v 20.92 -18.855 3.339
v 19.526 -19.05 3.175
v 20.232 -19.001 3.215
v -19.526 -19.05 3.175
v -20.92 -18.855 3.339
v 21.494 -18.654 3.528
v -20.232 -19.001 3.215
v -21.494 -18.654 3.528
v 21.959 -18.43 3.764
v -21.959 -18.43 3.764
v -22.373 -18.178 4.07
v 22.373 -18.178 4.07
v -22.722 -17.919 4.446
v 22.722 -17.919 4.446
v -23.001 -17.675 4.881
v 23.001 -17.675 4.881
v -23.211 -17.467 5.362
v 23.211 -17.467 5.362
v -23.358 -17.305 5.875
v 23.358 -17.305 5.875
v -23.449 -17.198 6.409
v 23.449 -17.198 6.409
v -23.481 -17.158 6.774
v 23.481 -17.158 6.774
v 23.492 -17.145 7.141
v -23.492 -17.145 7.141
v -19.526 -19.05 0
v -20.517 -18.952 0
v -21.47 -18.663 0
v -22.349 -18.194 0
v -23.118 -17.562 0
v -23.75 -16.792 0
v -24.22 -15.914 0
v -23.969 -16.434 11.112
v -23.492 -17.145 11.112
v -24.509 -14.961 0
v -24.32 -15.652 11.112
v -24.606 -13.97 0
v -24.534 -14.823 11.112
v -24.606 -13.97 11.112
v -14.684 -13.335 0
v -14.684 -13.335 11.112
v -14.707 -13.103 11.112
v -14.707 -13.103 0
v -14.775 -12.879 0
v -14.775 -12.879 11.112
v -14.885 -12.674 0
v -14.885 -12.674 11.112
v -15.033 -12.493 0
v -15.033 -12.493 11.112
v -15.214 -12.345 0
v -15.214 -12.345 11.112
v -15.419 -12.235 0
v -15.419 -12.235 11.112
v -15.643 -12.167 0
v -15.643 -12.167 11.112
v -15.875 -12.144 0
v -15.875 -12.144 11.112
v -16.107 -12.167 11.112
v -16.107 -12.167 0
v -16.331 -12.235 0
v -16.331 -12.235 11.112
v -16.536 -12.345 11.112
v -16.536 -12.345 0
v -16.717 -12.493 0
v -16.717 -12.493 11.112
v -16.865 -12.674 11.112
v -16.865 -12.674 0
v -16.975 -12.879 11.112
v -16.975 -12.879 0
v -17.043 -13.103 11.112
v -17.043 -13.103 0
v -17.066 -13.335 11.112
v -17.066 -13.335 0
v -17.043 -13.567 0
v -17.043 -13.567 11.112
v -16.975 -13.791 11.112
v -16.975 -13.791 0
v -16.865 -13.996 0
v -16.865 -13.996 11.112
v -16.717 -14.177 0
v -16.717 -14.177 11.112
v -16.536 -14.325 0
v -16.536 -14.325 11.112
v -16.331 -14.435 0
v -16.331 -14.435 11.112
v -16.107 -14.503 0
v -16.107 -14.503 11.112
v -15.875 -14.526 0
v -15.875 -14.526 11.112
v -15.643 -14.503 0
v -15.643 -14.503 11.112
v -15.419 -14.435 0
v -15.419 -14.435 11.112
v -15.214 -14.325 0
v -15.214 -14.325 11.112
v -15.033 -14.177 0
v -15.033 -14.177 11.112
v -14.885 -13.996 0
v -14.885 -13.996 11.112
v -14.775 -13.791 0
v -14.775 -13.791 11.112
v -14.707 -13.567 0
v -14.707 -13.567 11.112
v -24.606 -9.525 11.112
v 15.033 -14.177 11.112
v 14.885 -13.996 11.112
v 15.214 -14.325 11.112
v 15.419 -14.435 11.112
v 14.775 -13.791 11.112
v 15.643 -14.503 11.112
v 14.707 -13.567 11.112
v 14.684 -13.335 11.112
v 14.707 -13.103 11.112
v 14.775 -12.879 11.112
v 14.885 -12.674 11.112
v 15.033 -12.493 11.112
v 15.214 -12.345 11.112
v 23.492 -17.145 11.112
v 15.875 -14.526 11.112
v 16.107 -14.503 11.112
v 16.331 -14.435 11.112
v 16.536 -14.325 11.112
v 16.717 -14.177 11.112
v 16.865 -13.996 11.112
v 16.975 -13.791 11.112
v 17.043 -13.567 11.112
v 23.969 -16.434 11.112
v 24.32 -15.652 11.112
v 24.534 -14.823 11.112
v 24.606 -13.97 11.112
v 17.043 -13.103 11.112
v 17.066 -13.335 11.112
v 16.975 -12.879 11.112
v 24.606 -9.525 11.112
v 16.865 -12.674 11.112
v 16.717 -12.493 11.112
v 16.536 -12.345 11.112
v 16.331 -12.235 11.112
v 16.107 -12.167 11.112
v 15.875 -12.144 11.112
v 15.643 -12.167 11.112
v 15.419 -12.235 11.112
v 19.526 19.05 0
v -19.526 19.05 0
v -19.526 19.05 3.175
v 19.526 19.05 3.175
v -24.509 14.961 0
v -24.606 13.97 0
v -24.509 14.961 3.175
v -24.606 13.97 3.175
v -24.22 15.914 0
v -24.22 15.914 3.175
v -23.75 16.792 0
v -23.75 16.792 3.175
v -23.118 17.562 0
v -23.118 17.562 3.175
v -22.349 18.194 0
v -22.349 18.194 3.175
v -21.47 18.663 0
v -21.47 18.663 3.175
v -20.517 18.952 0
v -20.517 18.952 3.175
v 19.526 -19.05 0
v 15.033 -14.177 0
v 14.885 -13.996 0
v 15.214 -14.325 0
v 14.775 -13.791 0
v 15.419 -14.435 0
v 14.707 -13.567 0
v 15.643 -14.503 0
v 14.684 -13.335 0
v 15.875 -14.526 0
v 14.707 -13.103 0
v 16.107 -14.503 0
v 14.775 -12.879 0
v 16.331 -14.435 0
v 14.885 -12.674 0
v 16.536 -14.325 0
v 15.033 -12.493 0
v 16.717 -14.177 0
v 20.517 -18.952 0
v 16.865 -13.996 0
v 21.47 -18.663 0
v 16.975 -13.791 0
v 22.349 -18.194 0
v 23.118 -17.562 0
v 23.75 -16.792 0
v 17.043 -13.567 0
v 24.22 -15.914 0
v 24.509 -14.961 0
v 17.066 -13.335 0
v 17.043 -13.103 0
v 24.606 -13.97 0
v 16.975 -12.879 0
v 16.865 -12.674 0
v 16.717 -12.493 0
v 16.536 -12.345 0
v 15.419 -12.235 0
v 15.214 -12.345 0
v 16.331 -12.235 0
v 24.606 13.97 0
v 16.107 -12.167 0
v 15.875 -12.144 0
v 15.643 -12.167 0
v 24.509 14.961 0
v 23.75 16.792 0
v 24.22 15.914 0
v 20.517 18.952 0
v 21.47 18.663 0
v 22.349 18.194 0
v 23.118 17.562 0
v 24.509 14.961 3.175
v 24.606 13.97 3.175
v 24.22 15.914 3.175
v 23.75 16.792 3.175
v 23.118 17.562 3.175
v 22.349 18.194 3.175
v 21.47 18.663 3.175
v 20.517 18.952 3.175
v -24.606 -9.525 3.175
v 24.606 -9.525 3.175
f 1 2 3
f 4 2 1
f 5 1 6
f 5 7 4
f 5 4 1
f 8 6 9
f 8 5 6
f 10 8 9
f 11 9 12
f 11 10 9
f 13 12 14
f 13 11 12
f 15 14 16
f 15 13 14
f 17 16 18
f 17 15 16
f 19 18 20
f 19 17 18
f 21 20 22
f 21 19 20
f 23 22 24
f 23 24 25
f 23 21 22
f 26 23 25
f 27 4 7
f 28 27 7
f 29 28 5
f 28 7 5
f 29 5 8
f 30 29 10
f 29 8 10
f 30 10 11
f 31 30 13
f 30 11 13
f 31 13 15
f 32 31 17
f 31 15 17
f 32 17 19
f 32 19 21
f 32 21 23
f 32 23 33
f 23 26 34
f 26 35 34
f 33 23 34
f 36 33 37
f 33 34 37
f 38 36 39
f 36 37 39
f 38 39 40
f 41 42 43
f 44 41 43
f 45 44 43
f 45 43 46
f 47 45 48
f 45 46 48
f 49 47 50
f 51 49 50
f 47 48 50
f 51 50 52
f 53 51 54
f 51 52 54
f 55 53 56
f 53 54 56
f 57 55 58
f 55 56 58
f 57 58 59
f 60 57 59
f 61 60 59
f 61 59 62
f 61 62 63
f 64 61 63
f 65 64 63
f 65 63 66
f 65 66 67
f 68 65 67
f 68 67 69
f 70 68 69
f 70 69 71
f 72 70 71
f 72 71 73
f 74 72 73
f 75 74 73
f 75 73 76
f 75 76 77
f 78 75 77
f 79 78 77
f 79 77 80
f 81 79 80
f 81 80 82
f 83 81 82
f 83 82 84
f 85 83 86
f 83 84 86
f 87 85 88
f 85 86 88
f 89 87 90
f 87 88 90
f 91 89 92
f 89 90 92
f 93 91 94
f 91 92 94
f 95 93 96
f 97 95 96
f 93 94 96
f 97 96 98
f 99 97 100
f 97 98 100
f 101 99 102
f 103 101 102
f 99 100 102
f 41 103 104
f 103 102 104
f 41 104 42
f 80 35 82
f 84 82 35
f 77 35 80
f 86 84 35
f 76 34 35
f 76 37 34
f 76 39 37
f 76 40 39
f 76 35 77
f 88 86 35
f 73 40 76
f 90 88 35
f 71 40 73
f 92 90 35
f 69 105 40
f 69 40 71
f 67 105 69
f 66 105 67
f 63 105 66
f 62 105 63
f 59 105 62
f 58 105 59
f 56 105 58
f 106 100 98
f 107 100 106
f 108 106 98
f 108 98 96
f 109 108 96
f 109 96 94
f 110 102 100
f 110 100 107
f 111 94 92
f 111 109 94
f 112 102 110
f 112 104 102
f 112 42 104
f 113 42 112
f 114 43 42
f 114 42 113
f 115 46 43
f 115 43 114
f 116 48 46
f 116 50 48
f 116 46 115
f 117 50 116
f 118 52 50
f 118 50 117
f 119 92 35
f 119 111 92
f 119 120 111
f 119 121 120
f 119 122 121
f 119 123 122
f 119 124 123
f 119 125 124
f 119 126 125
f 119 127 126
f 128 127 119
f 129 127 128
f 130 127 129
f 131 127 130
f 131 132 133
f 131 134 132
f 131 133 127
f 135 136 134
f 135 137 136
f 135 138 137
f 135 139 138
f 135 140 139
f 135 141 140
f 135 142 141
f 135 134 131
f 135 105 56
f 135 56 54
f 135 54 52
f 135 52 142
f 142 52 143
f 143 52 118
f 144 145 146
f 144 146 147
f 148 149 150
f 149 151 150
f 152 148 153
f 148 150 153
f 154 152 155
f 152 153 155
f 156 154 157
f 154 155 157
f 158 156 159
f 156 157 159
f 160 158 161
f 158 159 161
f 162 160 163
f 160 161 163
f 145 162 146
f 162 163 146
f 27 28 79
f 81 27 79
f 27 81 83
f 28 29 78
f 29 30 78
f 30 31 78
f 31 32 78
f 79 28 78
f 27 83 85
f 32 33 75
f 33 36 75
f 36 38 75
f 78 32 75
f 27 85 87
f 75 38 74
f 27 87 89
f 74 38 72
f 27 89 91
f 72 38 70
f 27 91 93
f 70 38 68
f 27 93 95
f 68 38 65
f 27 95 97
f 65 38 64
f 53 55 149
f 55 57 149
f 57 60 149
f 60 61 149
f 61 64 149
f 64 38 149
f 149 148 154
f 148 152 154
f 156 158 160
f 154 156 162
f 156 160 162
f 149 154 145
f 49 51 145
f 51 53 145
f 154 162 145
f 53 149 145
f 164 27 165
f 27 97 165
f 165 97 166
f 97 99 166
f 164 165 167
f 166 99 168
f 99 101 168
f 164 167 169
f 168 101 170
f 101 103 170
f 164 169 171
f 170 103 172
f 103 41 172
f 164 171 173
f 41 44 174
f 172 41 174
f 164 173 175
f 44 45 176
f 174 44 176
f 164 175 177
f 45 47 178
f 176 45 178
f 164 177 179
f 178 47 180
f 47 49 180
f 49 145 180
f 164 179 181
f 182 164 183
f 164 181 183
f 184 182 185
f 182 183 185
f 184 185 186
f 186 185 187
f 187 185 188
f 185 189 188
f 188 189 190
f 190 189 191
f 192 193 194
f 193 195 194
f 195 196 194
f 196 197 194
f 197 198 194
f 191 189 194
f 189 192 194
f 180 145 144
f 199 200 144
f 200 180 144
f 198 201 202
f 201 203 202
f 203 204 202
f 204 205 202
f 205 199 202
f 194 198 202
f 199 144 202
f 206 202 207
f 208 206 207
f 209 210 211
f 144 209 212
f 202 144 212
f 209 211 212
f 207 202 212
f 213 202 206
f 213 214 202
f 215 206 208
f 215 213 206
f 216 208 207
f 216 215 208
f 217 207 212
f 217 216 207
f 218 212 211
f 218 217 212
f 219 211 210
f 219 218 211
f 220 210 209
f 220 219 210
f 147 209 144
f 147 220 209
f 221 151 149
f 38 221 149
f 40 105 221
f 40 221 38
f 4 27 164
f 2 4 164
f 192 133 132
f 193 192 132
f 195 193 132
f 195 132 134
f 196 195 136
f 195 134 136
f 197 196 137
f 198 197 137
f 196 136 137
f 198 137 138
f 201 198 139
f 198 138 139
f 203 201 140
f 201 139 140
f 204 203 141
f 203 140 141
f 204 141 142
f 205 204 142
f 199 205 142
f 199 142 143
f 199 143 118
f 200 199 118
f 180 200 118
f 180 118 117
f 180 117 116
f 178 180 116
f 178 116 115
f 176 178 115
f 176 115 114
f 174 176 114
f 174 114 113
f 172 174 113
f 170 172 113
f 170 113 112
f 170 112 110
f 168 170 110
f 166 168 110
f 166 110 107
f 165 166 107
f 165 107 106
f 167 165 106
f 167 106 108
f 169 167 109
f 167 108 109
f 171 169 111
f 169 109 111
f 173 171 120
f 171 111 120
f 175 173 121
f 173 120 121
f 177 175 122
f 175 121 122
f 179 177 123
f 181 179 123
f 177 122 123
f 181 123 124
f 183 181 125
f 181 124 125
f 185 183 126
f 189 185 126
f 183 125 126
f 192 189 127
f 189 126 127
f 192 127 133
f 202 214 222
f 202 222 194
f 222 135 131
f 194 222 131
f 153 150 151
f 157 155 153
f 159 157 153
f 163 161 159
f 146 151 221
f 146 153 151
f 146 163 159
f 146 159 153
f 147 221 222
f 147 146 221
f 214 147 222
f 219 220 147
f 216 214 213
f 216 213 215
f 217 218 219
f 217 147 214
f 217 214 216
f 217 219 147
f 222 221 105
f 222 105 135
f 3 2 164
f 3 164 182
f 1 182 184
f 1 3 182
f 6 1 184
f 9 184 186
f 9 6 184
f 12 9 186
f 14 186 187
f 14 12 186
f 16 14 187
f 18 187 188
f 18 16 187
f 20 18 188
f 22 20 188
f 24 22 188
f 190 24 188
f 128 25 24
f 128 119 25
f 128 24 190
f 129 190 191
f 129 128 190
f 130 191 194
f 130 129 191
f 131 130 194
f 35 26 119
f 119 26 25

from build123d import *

# Parameters (mm, degrees)
F0_W        = 49.2125
F0_H        = 38.1
F1_DEPTH    = 3.175
F2_W        = 49.2125
F2_H        = 7.62
F3_DEPTH    = 7.9375
F4_R        = 1.190625
F5_DEPTH    = 25.4
F6_T1_DEPTH = 49.2125
F7_R        = 5.08


# Not quite as in the source:
# - a fillet or chamfer that OpenCascade refuses, or shapes differently, is made with other operations: its cross-section is extruded or revolved along the edge and cut away or added


with BuildPart() as f1:
    # F0 (on Top) → F1 (new body)
    with BuildSketch(Plane.XY):
        Rectangle(F0_W, F0_H)
    extrude(amount=F1_DEPTH)

    # F2 (on face) → F3 (join)
    with BuildSketch(Plane.XY.offset(3.175)):
        with Locations((0, -13.335)):
            Rectangle(F2_W, F2_H)
    extrude(amount=F3_DEPTH)

    # F4 (on face) → F5 (cut)
    with BuildSketch(Plane.XY.offset(11.1125)):
        with Locations((-15.875, -13.335)):
            Circle(F4_R)
        with Locations((15.875, -13.335)):
            Circle(F4_R)
    extrude(amount=-F5_DEPTH, mode=Mode.SUBTRACT)

    # F6: fillet of radius 5.08 on 1 edges, made by hand

    # F6_s2 → F6_t1 (join)
    with BuildSketch(Plane.YZ.offset(-24.60625)):
        with BuildLine():
            ThreePointArc((-19.05, 3.175), (-17.6459498802, 4.9408692034), (-17.145, 7.140573729))
            Line((-17.145, 7.140573729), (-17.145, 3.175))
            Line((-17.145, 3.175), (-19.05, 3.175))
        make_face()
    extrude(amount=F6_T1_DEPTH)

    # F7
    f7_edges = [f1.edges().sort_by_distance(p)[0] for p in [
        (-24.60625, -19.05, 1.5875),
        (24.60625, -19.05, 1.5875),
        (24.60625, 19.05, 1.5875),
        (-24.60625, 19.05, 1.5875),
    ]]
    fillet(f7_edges, radius=F7_R)


solid = f1.part
